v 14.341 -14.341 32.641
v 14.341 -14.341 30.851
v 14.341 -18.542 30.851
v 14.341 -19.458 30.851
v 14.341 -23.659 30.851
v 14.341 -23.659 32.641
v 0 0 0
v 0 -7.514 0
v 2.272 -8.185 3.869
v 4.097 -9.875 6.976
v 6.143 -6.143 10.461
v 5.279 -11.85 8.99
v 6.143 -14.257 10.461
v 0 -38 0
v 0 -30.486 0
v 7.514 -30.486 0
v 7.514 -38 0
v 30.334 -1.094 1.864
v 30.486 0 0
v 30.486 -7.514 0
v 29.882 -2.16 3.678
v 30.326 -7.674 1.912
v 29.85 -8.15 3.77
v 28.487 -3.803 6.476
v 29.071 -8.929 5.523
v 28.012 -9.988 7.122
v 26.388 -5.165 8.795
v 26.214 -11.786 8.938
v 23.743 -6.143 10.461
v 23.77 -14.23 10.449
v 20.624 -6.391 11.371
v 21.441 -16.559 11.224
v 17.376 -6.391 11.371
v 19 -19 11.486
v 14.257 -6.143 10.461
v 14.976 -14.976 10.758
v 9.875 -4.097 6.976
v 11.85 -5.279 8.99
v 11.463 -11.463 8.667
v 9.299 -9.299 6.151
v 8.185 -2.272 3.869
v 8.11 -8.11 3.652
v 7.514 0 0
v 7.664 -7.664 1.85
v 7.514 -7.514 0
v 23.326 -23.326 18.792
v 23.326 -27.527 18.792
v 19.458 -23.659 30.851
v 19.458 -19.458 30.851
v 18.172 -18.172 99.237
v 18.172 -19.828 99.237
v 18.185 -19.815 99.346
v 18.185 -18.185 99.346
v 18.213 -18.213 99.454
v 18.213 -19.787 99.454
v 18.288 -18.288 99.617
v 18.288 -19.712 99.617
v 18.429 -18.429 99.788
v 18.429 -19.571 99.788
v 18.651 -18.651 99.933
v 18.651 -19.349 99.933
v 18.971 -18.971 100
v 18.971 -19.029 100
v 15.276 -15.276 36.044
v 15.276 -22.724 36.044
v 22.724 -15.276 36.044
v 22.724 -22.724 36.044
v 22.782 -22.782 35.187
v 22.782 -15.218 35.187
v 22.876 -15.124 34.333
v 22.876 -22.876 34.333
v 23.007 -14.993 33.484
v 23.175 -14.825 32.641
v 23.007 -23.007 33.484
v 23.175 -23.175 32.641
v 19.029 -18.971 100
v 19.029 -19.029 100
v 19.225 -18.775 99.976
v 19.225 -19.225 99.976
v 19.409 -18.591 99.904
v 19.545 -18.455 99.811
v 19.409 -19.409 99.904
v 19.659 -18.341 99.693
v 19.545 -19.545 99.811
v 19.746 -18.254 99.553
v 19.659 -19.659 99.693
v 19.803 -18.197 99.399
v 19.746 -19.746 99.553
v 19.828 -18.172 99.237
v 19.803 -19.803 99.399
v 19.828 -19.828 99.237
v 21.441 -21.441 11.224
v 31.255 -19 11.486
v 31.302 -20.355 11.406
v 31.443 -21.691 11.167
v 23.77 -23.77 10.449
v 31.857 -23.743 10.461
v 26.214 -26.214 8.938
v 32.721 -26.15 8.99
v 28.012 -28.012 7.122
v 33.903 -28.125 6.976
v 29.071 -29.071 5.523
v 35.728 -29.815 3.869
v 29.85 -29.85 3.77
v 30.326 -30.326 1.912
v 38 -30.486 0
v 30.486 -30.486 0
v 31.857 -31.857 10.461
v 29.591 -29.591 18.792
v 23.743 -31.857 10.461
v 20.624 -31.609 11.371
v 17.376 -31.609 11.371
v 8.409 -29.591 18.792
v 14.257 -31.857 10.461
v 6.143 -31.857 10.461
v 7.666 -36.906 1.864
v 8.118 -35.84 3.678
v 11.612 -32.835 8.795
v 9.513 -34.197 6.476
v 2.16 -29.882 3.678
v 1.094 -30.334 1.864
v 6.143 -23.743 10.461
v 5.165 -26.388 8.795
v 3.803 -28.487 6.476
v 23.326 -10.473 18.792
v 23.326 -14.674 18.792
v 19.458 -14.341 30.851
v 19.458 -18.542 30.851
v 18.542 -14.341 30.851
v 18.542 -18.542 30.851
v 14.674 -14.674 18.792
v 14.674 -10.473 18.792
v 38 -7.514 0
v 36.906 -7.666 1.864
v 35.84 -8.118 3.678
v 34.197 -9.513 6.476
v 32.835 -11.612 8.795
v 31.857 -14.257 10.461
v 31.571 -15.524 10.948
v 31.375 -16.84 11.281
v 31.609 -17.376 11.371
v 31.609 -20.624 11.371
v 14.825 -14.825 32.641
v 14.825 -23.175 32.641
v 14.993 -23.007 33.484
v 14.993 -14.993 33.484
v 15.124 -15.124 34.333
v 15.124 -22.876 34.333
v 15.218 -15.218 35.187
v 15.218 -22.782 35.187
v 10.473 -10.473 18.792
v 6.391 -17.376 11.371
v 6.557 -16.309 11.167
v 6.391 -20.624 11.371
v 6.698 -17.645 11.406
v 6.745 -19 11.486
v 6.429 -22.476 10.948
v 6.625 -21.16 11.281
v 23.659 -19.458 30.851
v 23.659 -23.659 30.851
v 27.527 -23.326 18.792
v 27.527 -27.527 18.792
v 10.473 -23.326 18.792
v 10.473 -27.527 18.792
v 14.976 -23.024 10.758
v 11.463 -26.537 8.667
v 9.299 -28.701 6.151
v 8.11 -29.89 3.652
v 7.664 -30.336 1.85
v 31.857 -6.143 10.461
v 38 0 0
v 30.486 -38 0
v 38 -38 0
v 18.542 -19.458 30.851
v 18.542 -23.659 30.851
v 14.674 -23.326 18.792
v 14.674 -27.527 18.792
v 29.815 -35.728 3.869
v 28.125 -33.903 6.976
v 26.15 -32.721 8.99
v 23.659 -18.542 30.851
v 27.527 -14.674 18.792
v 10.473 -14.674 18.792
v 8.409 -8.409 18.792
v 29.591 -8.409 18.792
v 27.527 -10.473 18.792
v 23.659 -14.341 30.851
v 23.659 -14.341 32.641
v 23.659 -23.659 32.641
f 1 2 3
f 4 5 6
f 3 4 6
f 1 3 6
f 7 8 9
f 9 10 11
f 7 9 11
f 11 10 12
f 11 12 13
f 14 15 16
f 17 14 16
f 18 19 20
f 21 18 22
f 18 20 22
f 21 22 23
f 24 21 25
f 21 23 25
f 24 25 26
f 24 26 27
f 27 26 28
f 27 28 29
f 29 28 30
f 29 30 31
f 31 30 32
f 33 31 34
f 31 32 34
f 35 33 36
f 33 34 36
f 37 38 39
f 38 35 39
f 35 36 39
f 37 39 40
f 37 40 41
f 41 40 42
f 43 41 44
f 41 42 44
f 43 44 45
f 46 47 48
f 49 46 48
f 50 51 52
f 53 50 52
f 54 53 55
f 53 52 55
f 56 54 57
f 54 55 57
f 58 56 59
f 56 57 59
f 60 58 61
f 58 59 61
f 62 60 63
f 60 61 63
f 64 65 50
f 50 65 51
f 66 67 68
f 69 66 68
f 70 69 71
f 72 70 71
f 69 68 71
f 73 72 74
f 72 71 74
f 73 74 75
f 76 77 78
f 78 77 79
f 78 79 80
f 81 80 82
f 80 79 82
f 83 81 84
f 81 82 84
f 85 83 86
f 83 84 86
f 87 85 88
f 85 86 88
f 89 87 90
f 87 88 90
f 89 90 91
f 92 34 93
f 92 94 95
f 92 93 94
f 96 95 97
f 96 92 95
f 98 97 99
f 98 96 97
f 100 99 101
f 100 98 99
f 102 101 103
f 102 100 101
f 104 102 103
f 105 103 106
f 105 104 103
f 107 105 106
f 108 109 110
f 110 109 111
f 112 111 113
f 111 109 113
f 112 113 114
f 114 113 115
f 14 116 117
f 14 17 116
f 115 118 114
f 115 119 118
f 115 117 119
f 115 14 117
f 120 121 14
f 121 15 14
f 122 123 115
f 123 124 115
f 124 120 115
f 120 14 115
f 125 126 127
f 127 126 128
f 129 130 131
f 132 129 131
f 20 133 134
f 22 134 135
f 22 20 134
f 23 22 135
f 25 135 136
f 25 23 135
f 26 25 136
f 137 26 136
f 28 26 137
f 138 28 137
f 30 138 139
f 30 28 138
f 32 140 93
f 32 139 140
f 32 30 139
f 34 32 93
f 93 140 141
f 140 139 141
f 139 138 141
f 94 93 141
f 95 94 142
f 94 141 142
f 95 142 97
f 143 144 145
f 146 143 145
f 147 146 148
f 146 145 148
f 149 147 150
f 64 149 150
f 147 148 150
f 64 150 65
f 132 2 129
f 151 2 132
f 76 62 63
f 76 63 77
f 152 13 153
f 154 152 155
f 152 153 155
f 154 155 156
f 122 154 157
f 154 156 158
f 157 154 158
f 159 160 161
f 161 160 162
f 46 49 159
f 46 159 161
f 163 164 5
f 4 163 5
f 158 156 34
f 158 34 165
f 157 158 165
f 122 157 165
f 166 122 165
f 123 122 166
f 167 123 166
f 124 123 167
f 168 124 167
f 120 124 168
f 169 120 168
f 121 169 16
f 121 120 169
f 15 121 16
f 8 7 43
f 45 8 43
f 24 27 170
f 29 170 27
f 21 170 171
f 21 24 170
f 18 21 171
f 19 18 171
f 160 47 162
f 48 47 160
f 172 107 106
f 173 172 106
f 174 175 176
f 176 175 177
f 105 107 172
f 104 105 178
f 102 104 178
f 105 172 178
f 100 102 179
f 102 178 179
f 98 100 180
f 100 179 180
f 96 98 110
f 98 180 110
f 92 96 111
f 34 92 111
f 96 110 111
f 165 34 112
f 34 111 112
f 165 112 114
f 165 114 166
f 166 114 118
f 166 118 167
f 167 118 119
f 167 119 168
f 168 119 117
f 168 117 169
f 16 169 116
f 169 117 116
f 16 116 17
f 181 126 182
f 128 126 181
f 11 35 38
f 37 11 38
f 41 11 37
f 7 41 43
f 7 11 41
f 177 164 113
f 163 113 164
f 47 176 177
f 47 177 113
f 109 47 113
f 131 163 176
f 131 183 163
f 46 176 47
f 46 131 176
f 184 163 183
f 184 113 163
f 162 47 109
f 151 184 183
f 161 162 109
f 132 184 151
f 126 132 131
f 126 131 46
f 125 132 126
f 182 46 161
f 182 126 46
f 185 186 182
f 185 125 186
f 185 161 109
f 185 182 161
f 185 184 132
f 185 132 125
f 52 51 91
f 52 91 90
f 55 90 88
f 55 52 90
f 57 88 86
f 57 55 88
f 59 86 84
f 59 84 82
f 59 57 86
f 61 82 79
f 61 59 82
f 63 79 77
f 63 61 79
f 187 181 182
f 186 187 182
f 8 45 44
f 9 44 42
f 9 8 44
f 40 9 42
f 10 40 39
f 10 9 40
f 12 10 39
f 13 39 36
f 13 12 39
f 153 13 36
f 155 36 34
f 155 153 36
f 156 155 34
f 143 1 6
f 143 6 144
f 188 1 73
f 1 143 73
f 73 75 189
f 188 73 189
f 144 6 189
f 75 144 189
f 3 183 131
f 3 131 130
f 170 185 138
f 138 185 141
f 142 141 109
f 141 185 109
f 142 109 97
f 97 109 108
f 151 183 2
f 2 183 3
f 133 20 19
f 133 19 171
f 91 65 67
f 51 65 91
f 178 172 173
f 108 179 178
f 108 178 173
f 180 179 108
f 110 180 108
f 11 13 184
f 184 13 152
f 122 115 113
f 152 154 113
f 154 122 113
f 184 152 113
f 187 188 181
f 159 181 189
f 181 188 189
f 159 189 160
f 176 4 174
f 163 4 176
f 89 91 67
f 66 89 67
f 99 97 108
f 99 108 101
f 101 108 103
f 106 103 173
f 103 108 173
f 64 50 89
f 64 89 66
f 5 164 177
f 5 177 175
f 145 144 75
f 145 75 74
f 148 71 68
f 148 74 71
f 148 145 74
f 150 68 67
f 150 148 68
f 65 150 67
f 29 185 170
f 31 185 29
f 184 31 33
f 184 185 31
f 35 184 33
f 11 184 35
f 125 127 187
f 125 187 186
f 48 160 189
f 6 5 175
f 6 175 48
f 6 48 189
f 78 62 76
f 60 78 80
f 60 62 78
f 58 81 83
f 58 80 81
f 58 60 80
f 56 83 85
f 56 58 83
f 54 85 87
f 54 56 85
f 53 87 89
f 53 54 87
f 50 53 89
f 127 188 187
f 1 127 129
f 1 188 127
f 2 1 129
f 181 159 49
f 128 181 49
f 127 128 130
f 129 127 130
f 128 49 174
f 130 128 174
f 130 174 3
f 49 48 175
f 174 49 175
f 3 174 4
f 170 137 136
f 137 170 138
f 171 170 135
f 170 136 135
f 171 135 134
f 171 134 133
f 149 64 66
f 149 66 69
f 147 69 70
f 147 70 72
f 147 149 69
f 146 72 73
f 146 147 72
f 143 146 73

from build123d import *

# Parameters (mm, degrees)
F0_W          = 38
F0_H          = 100
F1_DEPTH      = 38
F3_DEPTH      = 38.001
F4_W          = 59.0429029957
F4_H          = 114.0045975335
F5_DEPTH      = 38.001
F6_T4_DEPTH   = 20.6495370786
F6_T10_DEPTH  = 33.6326816688
F6_T16_DEPTH  = 20.6495370786
F6_S17_R      = 11.4862592402
F6_T18_DEPTH  = 13
F6_T25_DEPTH  = 20.6495370786
F6_T31_DEPTH  = 33.6326816688
F6_T37_DEPTH  = 33.6326816688
F6_T43_DEPTH  = 20.6495370786
F6_T49_DEPTH  = 20.6495370786
F6_S53_R      = 11.4862592402
F6_T54_DEPTH  = 13
F6_T58_DEPTH  = 33.6326816688
F6_T64_DEPTH  = 20.6495370786
F6_T70_DEPTH  = 33.6326816688
F6_T76_DEPTH  = 20.6495370786
F6_T82_DEPTH  = 20.6495370786
F6_S84_R      = 11.4862592402
F6_T85_DEPTH  = 13
F6_T91_DEPTH  = 33.6326816688
F6_T97_DEPTH  = 20.6495370786
F6_T103_DEPTH = 33.6326816688
F6_T109_DEPTH = 20.6495370786
F6_T115_DEPTH = 20.6495370786
F6_S119_R     = 11.4862592402
F6_T120_DEPTH = 13
F6_T124_DEPTH = 33.6326816688
F6_T130_DEPTH = 20.6495370786
F6_T137_DEPTH = 33.6326816688
F6_T143_DEPTH = 33.6326816688
F6_T152_DEPTH = 33.6326816688
F6_T158_DEPTH = 33.6326816688
F6_T167_DEPTH = 33.6326816688
F6_T173_DEPTH = 33.6326816688
F6_T182_DEPTH = 33.6326816688
F6_T188_DEPTH = 33.6326816688


# Not quite as in the source:
# - a fillet or chamfer that OpenCascade refuses, or shapes differently, is made with other operations: its cross-section is extruded or revolved along the edge and cut away or added


with BuildPart() as f1:
    # F0 (on Front) → F1 (new body)
    with BuildSketch(Plane.XZ):
        with Locations((19, 50)):
            Rectangle(F0_W, F0_H)
    extrude(amount=F1_DEPTH)

    # F2 (on face) → F3 (cut, through all)
    with BuildSketch(Plane.XZ.offset(38)):
        with BuildLine():
            ThreePointArc((18.1722940034, 99.2366278339), (18.4188712552, 99.7784903919), (18.9714550646, 100))
            Line((18.9714550646, 100), (0, 100))
            Line((0, 100), (0, 0))
            Line((0, 0), (8.6752314607, 14.7728872032))
            Line((8.6752314607, 14.7728872032), (8.6752314607, 18.7919850665))
            Line((8.6752314607, 18.7919850665), (10.4733575719, 18.7919850665))
            Line((10.4733575719, 18.7919850665), (14.3412563191, 30.8507295043))
            Line((14.3412563191, 30.8507295043), (14.3412563191, 32.6412431896))
            Line((14.3412563191, 32.6412431896), (14.8252512637, 32.6412431896))
            ThreePointArc((14.8252512637, 32.6412431896), (15.1237302322, 34.3327275734), (15.2759763299, 36.0435841545))
            Line((15.2759763299, 36.0435841545), (18.1722940034, 99.2366278339))
        make_face()
        with BuildLine():
            Line((7.5137407598, 0), (30.4862592402, 0))
            ThreePointArc((30.4862592402, 0), (27.1220117992, 8.1220117992), (19, 11.4862592402))
            ThreePointArc((19, 11.4862592402), (10.8779882008, 8.1220117992), (7.5137407598, 0))
        make_face()
        with BuildLine():
            Line((38, 100), (19.0285449354, 100))
            ThreePointArc((19.0285449354, 100), (19.5811287448, 99.7784903919), (19.8277059966, 99.2366278339))
            Line((19.8277059966, 99.2366278339), (22.7240236701, 36.0435841545))
            ThreePointArc((22.7240236701, 36.0435841545), (22.8762697678, 34.3327275734), (23.1747487363, 32.6412431896))
            Line((23.1747487363, 32.6412431896), (23.6587436809, 32.6412431896))
            Line((23.6587436809, 32.6412431896), (23.6587436809, 30.8507295043))
            Line((23.6587436809, 30.8507295043), (27.5266424281, 18.7919850665))
            Line((27.5266424281, 18.7919850665), (29.3247685393, 18.7919850665))
            Line((29.3247685393, 18.7919850665), (29.3247685393, 14.7728872032))
            Line((29.3247685393, 14.7728872032), (38, 0))
            Line((38, 0), (38, 100))
        make_face()
        Polygon((18.5419868585, 30.8507295043), (14.6740881113, 18.7919850665), (23.3259118887, 18.7919850665), (19.4580131415, 30.8507295043), align=None)
    extrude(amount=-F3_DEPTH, mode=Mode.SUBTRACT)

    # F4 (on Right) → F5 (cut, through all)
    with BuildSketch(Plane.YZ):
        with Locations((-17.0494974502, 52.1172431763)):
            Rectangle(F4_W, F4_H)
        with BuildLine():
            Line((-19.0285449354, 100), (-19, 100))
            Line((-19, 100), (-18.9714550646, 100))
            ThreePointArc((-18.9714550646, 100), (-18.4188712552, 99.7784903919), (-18.1722940034, 99.2366278339))
            Line((-18.1722940034, 99.2366278339), (-15.2759763299, 36.0435841545))
            ThreePointArc((-15.2759763299, 36.0435841545), (-15.1237302322, 34.3327275734), (-14.8252512637, 32.6412431896))
            Line((-14.8252512637, 32.6412431896), (-14.3412563191, 32.6412431896))
            Line((-14.3412563191, 32.6412431896), (-14.3412563191, 30.8507295043))
            Line((-14.3412563191, 30.8507295043), (-10.4733575719, 18.7919850665))
            Line((-10.4733575719, 18.7919850665), (-8.6752314607, 18.7919850665))
            Line((-8.6752314607, 18.7919850665), (-8.6752314607, 14.7728872032))
            Line((-8.6752314607, 14.7728872032), (0, 0))
            Line((0, 0), (-7.5137407598, 0))
            ThreePointArc((-7.5137407598, 0), (-10.8779882008, 8.1220117992), (-19, 11.4862592402))
            ThreePointArc((-19, 11.4862592402), (-27.1220117992, 8.1220117992), (-30.4862592402, 0))
            Line((-30.4862592402, 0), (-38, 0))
            Line((-38, 0), (-29.3247685393, 14.7728872032))
            Line((-29.3247685393, 14.7728872032), (-29.3247685393, 18.7919850665))
            Line((-29.3247685393, 18.7919850665), (-27.5266424281, 18.7919850665))
            Line((-27.5266424281, 18.7919850665), (-23.6587436809, 30.8507295043))
            Line((-23.6587436809, 30.8507295043), (-23.6587436809, 32.6412431896))
            Line((-23.6587436809, 32.6412431896), (-23.1747487363, 32.6412431896))
            ThreePointArc((-23.1747487363, 32.6412431896), (-22.8762697678, 34.3327275734), (-22.7240236701, 36.0435841545))
            Line((-22.7240236701, 36.0435841545), (-19.8277059966, 99.2366278339))
            ThreePointArc((-19.8277059966, 99.2366278339), (-19.5811287448, 99.7784903919), (-19.0285449354, 100))
        make_face(mode=Mode.SUBTRACT)
        Polygon((-14.6740881113, 18.7919850665), (-18.5419868585, 30.8507295043), (-19.4580131415, 30.8507295043), (-23.3259118887, 18.7919850665), align=None)
    extrude(amount=F5_DEPTH, mode=Mode.SUBTRACT)

    # F6: chamfer of 5 on 4 edges, made by hand


with BuildPart() as f6_tool2:
    # F6_s3 → F6_t4 (new body)
    with BuildSketch(Plane.XZ.offset(29.3247685393)):
        Polygon((6.1433193707, 10.461342101), (8.6752314607, 19.7728872032), (8.6752314607, 14.7728872032), align=None)
    extrude(amount=-F6_T4_DEPTH)

    split(bisect_by=Plane(origin=(0, -28.2559201757, 16.59300882), x_dir=(1, 0, 0), z_dir=(0, -0.8623090204, 0.506382418)), keep=Keep.TOP)

    split(bisect_by=Plane.XY.offset(18.7919850665), keep=Keep.BOTTOM)


with BuildPart() as f1_1:
    add(f1.part)

    # F6_t1: union F6_tool2
    add(f6_tool2.part)


with BuildPart() as f6_tool8:
    # F6_s9 → F6_t10 (new body)
    with BuildSketch(Plane.XZ.offset(42.3079131295)):
        Polygon((6.1433193707, 10.461342101), (8.6752314607, 19.7728872032), (8.6752314607, 14.7728872032), align=None)
    extrude(amount=-F6_T10_DEPTH)

    split(bisect_by=Plane(origin=(0, -28.2559201757, 16.59300882), x_dir=(1, 0, 0), z_dir=(0, 0.8623090204, -0.506382418)), keep=Keep.TOP)

    split(bisect_by=Plane.XZ.offset(29.3247685393), keep=Keep.TOP)


with BuildPart() as f1_2:
    add(f1_1.part)

    # F6_t7: union F6_tool8
    add(f6_tool8.part)


with BuildPart() as f6_tool14:
    # F6_s15 → F6_t16 (new body)
    with BuildSketch(Plane.XZ.offset(29.3247685393)):
        Polygon((6.1433193707, 10.461342101), (8.6752314607, 19.7728872032), (8.6752314607, 14.7728872032), align=None)
    extrude(amount=-F6_T16_DEPTH)

    # F6_s17 → F6_t18 (cut, symmetric)
    with BuildSketch(Plane.YZ.offset(7.4)):
        with Locations((-19, 0)):
            Circle(F6_S17_R)
    extrude(amount=F6_T18_DEPTH, both=True, mode=Mode.SUBTRACT)

    split(bisect_by=Plane(origin=(0, -28.2559201757, 16.59300882), x_dir=(1, 0, 0), z_dir=(0, 0.8623090204, -0.506382418)), keep=Keep.TOP)

    split(bisect_by=Plane(origin=(0, 0, 0), x_dir=(1, 0, 0), z_dir=(0, -0.8623090204, -0.506382418)), keep=Keep.TOP)

    split(bisect_by=Plane.XY.offset(18.7919850665), keep=Keep.BOTTOM)


with BuildPart() as f1_3:
    add(f1_2.part)

    # F6_t13: union F6_tool14
    add(f6_tool14.part)


with BuildPart() as f6_tool23:
    # F6_s24 → F6_t25 (new body)
    with BuildSketch(Plane.XZ.offset(29.3247685393)):
        Polygon((6.1433193707, 10.461342101), (8.6752314607, 19.7728872032), (8.6752314607, 14.7728872032), align=None)
    extrude(amount=-F6_T25_DEPTH)

    split(bisect_by=Plane(origin=(0, 0, 0), x_dir=(1, 0, 0), z_dir=(0, 0.8623090204, 0.506382418)), keep=Keep.TOP)

    split(bisect_by=Plane.XY.offset(18.7919850665), keep=Keep.BOTTOM)


with BuildPart() as f1_4:
    add(f1_3.part)

    # F6_t22: union F6_tool23
    add(f6_tool23.part)


with BuildPart() as f6_tool29:
    # F6_s30 → F6_t31 (new body)
    with BuildSketch(Plane.XZ.offset(29.3247685393)):
        Polygon((6.1433193707, 10.461342101), (8.6752314607, 19.7728872032), (8.6752314607, 14.7728872032), align=None)
    extrude(amount=-F6_T31_DEPTH)

    split(bisect_by=Plane(origin=(0, 0, 0), x_dir=(1, 0, 0), z_dir=(0, -0.8623090204, -0.506382418)), keep=Keep.TOP)

    split(bisect_by=Plane.XZ.offset(8.6752314607), keep=Keep.BOTTOM)


with BuildPart() as f1_5:
    add(f1_4.part)

    # F6_t28: union F6_tool29
    add(f6_tool29.part)


with BuildPart() as f6_tool35:
    # F6_s36 → F6_t37 (new body)
    with BuildSketch(Plane.YZ.offset(-4.3079131295)):
        Polygon((-29.3247685393, 19.7728872032), (-31.8566806293, 10.461342101), (-29.3247685393, 14.7728872032), align=None)
    extrude(amount=F6_T37_DEPTH)

    split(bisect_by=Plane(origin=(0, 0, 0), x_dir=(0, 1, 0), z_dir=(0.8623090204, 0, -0.506382418)), keep=Keep.TOP)

    split(bisect_by=Plane.YZ.offset(8.6752314607), keep=Keep.BOTTOM)


with BuildPart() as f1_6:
    add(f1_5.part)

    # F6_t34: union F6_tool35
    add(f6_tool35.part)


with BuildPart() as f6_tool41:
    # F6_s42 → F6_t43 (new body)
    with BuildSketch(Plane.YZ.offset(8.6752314607)):
        Polygon((-29.3247685393, 19.7728872032), (-31.8566806293, 10.461342101), (-29.3247685393, 14.7728872032), align=None)
    extrude(amount=F6_T43_DEPTH)

    split(bisect_by=Plane(origin=(0, 0, 0), x_dir=(0, 1, 0), z_dir=(-0.8623090204, 0, 0.506382418)), keep=Keep.TOP)

    split(bisect_by=Plane.XY.offset(18.7919850665), keep=Keep.BOTTOM)


with BuildPart() as f1_7:
    add(f1_6.part)

    # F6_t40: union F6_tool41
    add(f6_tool41.part)


with BuildPart() as f6_tool47:
    # F6_s48 → F6_t49 (new body)
    with BuildSketch(Plane.YZ.offset(8.6752314607)):
        Polygon((-29.3247685393, 19.7728872032), (-31.8566806293, 10.461342101), (-29.3247685393, 14.7728872032), align=None)
    extrude(amount=F6_T49_DEPTH)

    split(bisect_by=Plane(origin=(0, 0, 0), x_dir=(0, 1, 0), z_dir=(0.8623090204, 0, -0.506382418)), keep=Keep.TOP)

    split(bisect_by=Plane.XY.offset(18.7919850665), keep=Keep.BOTTOM)

    split(bisect_by=Plane(origin=(28.2559201757, 0, 16.59300882), x_dir=(0, 1, 0), z_dir=(-0.8623090204, 0, -0.506382418)), keep=Keep.TOP)

    # F6_s53 → F6_t54 (cut, symmetric)
    with BuildSketch(Plane.XZ.offset(30.6)):
        with Locations((19, 0)):
            Circle(F6_S53_R)
    extrude(amount=F6_T54_DEPTH, both=True, mode=Mode.SUBTRACT)


with BuildPart() as f1_8:
    add(f1_7.part)

    # F6_t46: union F6_tool47
    add(f6_tool47.part)


with BuildPart() as f6_tool56:
    # F6_s57 → F6_t58 (new body)
    with BuildSketch(Plane.YZ.offset(8.6752314607)):
        Polygon((-29.3247685393, 19.7728872032), (-31.8566806293, 10.461342101), (-29.3247685393, 14.7728872032), align=None)
    extrude(amount=F6_T58_DEPTH)

    split(bisect_by=Plane.YZ.offset(29.3247685393), keep=Keep.TOP)

    split(bisect_by=Plane(origin=(28.2559201757, 0, 16.59300882), x_dir=(0, 1, 0), z_dir=(-0.8623090204, 0, -0.506382418)), keep=Keep.TOP)


with BuildPart() as f1_9:
    add(f1_8.part)

    # F6_t55: union F6_tool56
    add(f6_tool56.part)


with BuildPart() as f6_tool62:
    # F6_s63 → F6_t64 (new body)
    with BuildSketch(Plane.YZ.offset(8.6752314607)):
        Polygon((-29.3247685393, 19.7728872032), (-31.8566806293, 10.461342101), (-29.3247685393, 14.7728872032), align=None)
    extrude(amount=F6_T64_DEPTH)

    split(bisect_by=Plane.XY.offset(18.7919850665), keep=Keep.BOTTOM)

    split(bisect_by=Plane(origin=(28.2559201757, 0, 16.59300882), x_dir=(0, 1, 0), z_dir=(0.8623090204, 0, 0.506382418)), keep=Keep.TOP)


with BuildPart() as f1_10:
    add(f1_9.part)

    # F6_t61: union F6_tool62
    add(f6_tool62.part)


with BuildPart() as f6_tool68:
    # F6_s69 → F6_t70 (new body)
    with BuildSketch(Plane.XZ.offset(42.3079131295)):
        Polygon((29.3247685393, 19.7728872032), (31.8566806293, 10.461342101), (29.3247685393, 14.7728872032), align=None)
    extrude(amount=-F6_T70_DEPTH)

    split(bisect_by=Plane.XZ.offset(29.3247685393), keep=Keep.TOP)

    split(bisect_by=Plane(origin=(0, -28.2559201757, 16.59300882), x_dir=(1, 0, 0), z_dir=(0, 0.8623090204, -0.506382418)), keep=Keep.TOP)


with BuildPart() as f1_11:
    add(f1_10.part)

    # F6_t67: union F6_tool68
    add(f6_tool68.part)


with BuildPart() as f6_tool74:
    # F6_s75 → F6_t76 (new body)
    with BuildSketch(Plane.XZ.offset(29.3247685393)):
        Polygon((29.3247685393, 19.7728872032), (31.8566806293, 10.461342101), (29.3247685393, 14.7728872032), align=None)
    extrude(amount=-F6_T76_DEPTH)

    split(bisect_by=Plane.XY.offset(18.7919850665), keep=Keep.BOTTOM)

    split(bisect_by=Plane(origin=(0, -28.2559201757, 16.59300882), x_dir=(1, 0, 0), z_dir=(0, -0.8623090204, 0.506382418)), keep=Keep.TOP)


with BuildPart() as f1_12:
    add(f1_11.part)

    # F6_t73: union F6_tool74
    add(f6_tool74.part)


with BuildPart() as f6_tool80:
    # F6_s81 → F6_t82 (new body)
    with BuildSketch(Plane.XZ.offset(29.3247685393)):
        Polygon((29.3247685393, 19.7728872032), (31.8566806293, 10.461342101), (29.3247685393, 14.7728872032), align=None)
    extrude(amount=-F6_T82_DEPTH)

    split(bisect_by=Plane.XY.offset(18.7919850665), keep=Keep.BOTTOM)

    # F6_s84 → F6_t85 (cut, symmetric)
    with BuildSketch(Plane.YZ.offset(30.6)):
        with Locations((-19, 0)):
            Circle(F6_S84_R)
    extrude(amount=F6_T85_DEPTH, both=True, mode=Mode.SUBTRACT)

    split(bisect_by=Plane(origin=(0, 0, 0), x_dir=(1, 0, 0), z_dir=(0, -0.8623090204, -0.506382418)), keep=Keep.TOP)

    split(bisect_by=Plane(origin=(0, -28.2559201757, 16.59300882), x_dir=(1, 0, 0), z_dir=(0, 0.8623090204, -0.506382418)), keep=Keep.TOP)


with BuildPart() as f1_13:
    add(f1_12.part)

    # F6_t79: union F6_tool80
    add(f6_tool80.part)


with BuildPart() as f6_tool89:
    # F6_s90 → F6_t91 (new body)
    with BuildSketch(Plane.XZ.offset(29.3247685393)):
        Polygon((29.3247685393, 19.7728872032), (31.8566806293, 10.461342101), (29.3247685393, 14.7728872032), align=None)
    extrude(amount=-F6_T91_DEPTH)

    split(bisect_by=Plane.XZ.offset(8.6752314607), keep=Keep.BOTTOM)

    split(bisect_by=Plane(origin=(0, 0, 0), x_dir=(1, 0, 0), z_dir=(0, -0.8623090204, -0.506382418)), keep=Keep.TOP)


with BuildPart() as f1_14:
    add(f1_13.part)

    # F6_t88: union F6_tool89
    add(f6_tool89.part)


with BuildPart() as f6_tool95:
    # F6_s96 → F6_t97 (new body)
    with BuildSketch(Plane.XZ.offset(29.3247685393)):
        Polygon((29.3247685393, 19.7728872032), (31.8566806293, 10.461342101), (29.3247685393, 14.7728872032), align=None)
    extrude(amount=-F6_T97_DEPTH)

    split(bisect_by=Plane.XY.offset(18.7919850665), keep=Keep.BOTTOM)

    split(bisect_by=Plane(origin=(0, 0, 0), x_dir=(1, 0, 0), z_dir=(0, 0.8623090204, 0.506382418)), keep=Keep.TOP)


with BuildPart() as f1_15:
    add(f1_14.part)

    # F6_t94: union F6_tool95
    add(f6_tool95.part)


with BuildPart() as f6_tool101:
    # F6_s102 → F6_t103 (new body)
    with BuildSketch(Plane.YZ.offset(-4.3079131295)):
        Polygon((-8.6752314607, 19.7728872032), (-6.1433193707, 10.461342101), (-8.6752314607, 14.7728872032), align=None)
    extrude(amount=F6_T103_DEPTH)

    split(bisect_by=Plane(origin=(0, 0, 0), x_dir=(0, 1, 0), z_dir=(0.8623090204, 0, -0.506382418)), keep=Keep.TOP)

    split(bisect_by=Plane.YZ.offset(8.6752314607), keep=Keep.BOTTOM)


with BuildPart() as f1_16:
    add(f1_15.part)

    # F6_t100: union F6_tool101
    add(f6_tool101.part)


with BuildPart() as f6_tool107:
    # F6_s108 → F6_t109 (new body)
    with BuildSketch(Plane.YZ.offset(8.6752314607)):
        Polygon((-8.6752314607, 19.7728872032), (-6.1433193707, 10.461342101), (-8.6752314607, 14.7728872032), align=None)
    extrude(amount=F6_T109_DEPTH)

    split(bisect_by=Plane(origin=(0, 0, 0), x_dir=(0, 1, 0), z_dir=(-0.8623090204, 0, 0.506382418)), keep=Keep.TOP)

    split(bisect_by=Plane.XY.offset(18.7919850665), keep=Keep.BOTTOM)


with BuildPart() as f1_17:
    add(f1_16.part)

    # F6_t106: union F6_tool107
    add(f6_tool107.part)


with BuildPart() as f6_tool113:
    # F6_s114 → F6_t115 (new body)
    with BuildSketch(Plane.YZ.offset(8.6752314607)):
        Polygon((-8.6752314607, 19.7728872032), (-6.1433193707, 10.461342101), (-8.6752314607, 14.7728872032), align=None)
    extrude(amount=F6_T115_DEPTH)

    split(bisect_by=Plane(origin=(0, 0, 0), x_dir=(0, 1, 0), z_dir=(0.8623090204, 0, -0.506382418)), keep=Keep.TOP)

    split(bisect_by=Plane.XY.offset(18.7919850665), keep=Keep.BOTTOM)

    split(bisect_by=Plane(origin=(28.2559201757, 0, 16.59300882), x_dir=(0, 1, 0), z_dir=(-0.8623090204, 0, -0.506382418)), keep=Keep.TOP)

    # F6_s119 → F6_t120 (cut, symmetric)
    with BuildSketch(Plane.XZ.offset(7.4)):
        with Locations((19, 0)):
            Circle(F6_S119_R)
    extrude(amount=F6_T120_DEPTH, both=True, mode=Mode.SUBTRACT)


with BuildPart() as f1_18:
    add(f1_17.part)

    # F6_t112: union F6_tool113
    add(f6_tool113.part)


with BuildPart() as f6_tool122:
    # F6_s123 → F6_t124 (new body)
    with BuildSketch(Plane.YZ.offset(8.6752314607)):
        Polygon((-8.6752314607, 19.7728872032), (-6.1433193707, 10.461342101), (-8.6752314607, 14.7728872032), align=None)
    extrude(amount=F6_T124_DEPTH)

    split(bisect_by=Plane.YZ.offset(29.3247685393), keep=Keep.TOP)

    split(bisect_by=Plane(origin=(28.2559201757, 0, 16.59300882), x_dir=(0, 1, 0), z_dir=(-0.8623090204, 0, -0.506382418)), keep=Keep.TOP)


with BuildPart() as f1_19:
    add(f1_18.part)

    # F6_t121: union F6_tool122
    add(f6_tool122.part)


with BuildPart() as f6_tool128:
    # F6_s129 → F6_t130 (new body)
    with BuildSketch(Plane.YZ.offset(8.6752314607)):
        Polygon((-8.6752314607, 19.7728872032), (-6.1433193707, 10.461342101), (-8.6752314607, 14.7728872032), align=None)
    extrude(amount=F6_T130_DEPTH)

    split(bisect_by=Plane.XY.offset(18.7919850665), keep=Keep.BOTTOM)

    split(bisect_by=Plane(origin=(28.2559201757, 0, 16.59300882), x_dir=(0, 1, 0), z_dir=(0.8623090204, 0, 0.506382418)), keep=Keep.TOP)


with BuildPart() as f1_20:
    add(f1_19.part)

    # F6_t127: union F6_tool128
    add(f6_tool128.part)


with BuildPart() as f6_tool135:
    # F6_s136 → F6_t137 (new body)
    with BuildSketch(Plane.XZ.offset(42.3079131295)):
        Polygon((6.1433193707, 10.461342101), (8.6752314607, 19.7728872032), (8.6752314607, 14.7728872032), align=None)
    extrude(amount=-F6_T137_DEPTH)

    split(bisect_by=Plane(origin=(0, -28.2559201757, 16.59300882), x_dir=(1, 0, 0), z_dir=(0, -0.8623090204, 0.506382418)), keep=Keep.TOP)

    split(bisect_by=Plane.XZ.offset(29.3247685393), keep=Keep.TOP)

    split(bisect_by=Plane.XY.offset(18.7919850665), keep=Keep.BOTTOM)


with BuildPart() as f6_tool141:
    # F6_s142 → F6_t143 (new body)
    with BuildSketch(Plane.YZ.offset(-4.3079131295)):
        Polygon((-29.3247685393, 19.7728872032), (-31.8566806293, 10.461342101), (-29.3247685393, 14.7728872032), align=None)
    extrude(amount=F6_T143_DEPTH)

    split(bisect_by=Plane(origin=(0, 0, 0), x_dir=(0, 1, 0), z_dir=(-0.8623090204, 0, 0.506382418)), keep=Keep.TOP)

    split(bisect_by=Plane.YZ.offset(8.6752314607), keep=Keep.BOTTOM)

    split(bisect_by=Plane.XY.offset(18.7919850665), keep=Keep.BOTTOM)


with BuildPart() as f6_tool135_1:
    add(f6_tool135.part)

    # F6_t147: intersect F6_tool141
    add(f6_tool141.part, mode=Mode.INTERSECT)


with BuildPart() as f1_21:
    add(f1_20.part)

    # F6_t133: union F6_tool135
    add(f6_tool135_1.part)


with BuildPart() as f6_tool150:
    # F6_s151 → F6_t152 (new body)
    with BuildSketch(Plane.XZ.offset(29.3247685393)):
        Polygon((6.1433193707, 10.461342101), (8.6752314607, 19.7728872032), (8.6752314607, 14.7728872032), align=None)
    extrude(amount=-F6_T152_DEPTH)

    split(bisect_by=Plane(origin=(0, 0, 0), x_dir=(1, 0, 0), z_dir=(0, 0.8623090204, 0.506382418)), keep=Keep.TOP)

    split(bisect_by=Plane.XZ.offset(8.6752314607), keep=Keep.BOTTOM)

    split(bisect_by=Plane.XY.offset(18.7919850665), keep=Keep.BOTTOM)


with BuildPart() as f6_tool156:
    # F6_s157 → F6_t158 (new body)
    with BuildSketch(Plane.YZ.offset(-4.3079131295)):
        Polygon((-8.6752314607, 19.7728872032), (-6.1433193707, 10.461342101), (-8.6752314607, 14.7728872032), align=None)
    extrude(amount=F6_T158_DEPTH)

    split(bisect_by=Plane(origin=(0, 0, 0), x_dir=(0, 1, 0), z_dir=(-0.8623090204, 0, 0.506382418)), keep=Keep.TOP)

    split(bisect_by=Plane.YZ.offset(8.6752314607), keep=Keep.BOTTOM)

    split(bisect_by=Plane.XY.offset(18.7919850665), keep=Keep.BOTTOM)


with BuildPart() as f6_tool150_1:
    add(f6_tool150.part)

    # F6_t162: intersect F6_tool156
    add(f6_tool156.part, mode=Mode.INTERSECT)


with BuildPart() as f1_22:
    add(f1_21.part)

    # F6_t148: union F6_tool150
    add(f6_tool150_1.part)


with BuildPart() as f6_tool165:
    # F6_s166 → F6_t167 (new body)
    with BuildSketch(Plane.XZ.offset(42.3079131295)):
        Polygon((29.3247685393, 19.7728872032), (31.8566806293, 10.461342101), (29.3247685393, 14.7728872032), align=None)
    extrude(amount=-F6_T167_DEPTH)

    split(bisect_by=Plane.XY.offset(18.7919850665), keep=Keep.BOTTOM)

    split(bisect_by=Plane.XZ.offset(29.3247685393), keep=Keep.TOP)

    split(bisect_by=Plane(origin=(0, -28.2559201757, 16.59300882), x_dir=(1, 0, 0), z_dir=(0, -0.8623090204, 0.506382418)), keep=Keep.TOP)


with BuildPart() as f6_tool171:
    # F6_s172 → F6_t173 (new body)
    with BuildSketch(Plane.YZ.offset(8.6752314607)):
        Polygon((-29.3247685393, 19.7728872032), (-31.8566806293, 10.461342101), (-29.3247685393, 14.7728872032), align=None)
    extrude(amount=F6_T173_DEPTH)

    split(bisect_by=Plane.XY.offset(18.7919850665), keep=Keep.BOTTOM)

    split(bisect_by=Plane.YZ.offset(29.3247685393), keep=Keep.TOP)

    split(bisect_by=Plane(origin=(28.2559201757, 0, 16.59300882), x_dir=(0, 1, 0), z_dir=(0.8623090204, 0, 0.506382418)), keep=Keep.TOP)


with BuildPart() as f6_tool165_1:
    add(f6_tool165.part)

    # F6_t177: intersect F6_tool171
    add(f6_tool171.part, mode=Mode.INTERSECT)


with BuildPart() as f1_23:
    add(f1_22.part)

    # F6_t163: union F6_tool165
    add(f6_tool165_1.part)


with BuildPart() as f6_tool180:
    # F6_s181 → F6_t182 (new body)
    with BuildSketch(Plane.XZ.offset(29.3247685393)):
        Polygon((29.3247685393, 19.7728872032), (31.8566806293, 10.461342101), (29.3247685393, 14.7728872032), align=None)
    extrude(amount=-F6_T182_DEPTH)

    split(bisect_by=Plane.XY.offset(18.7919850665), keep=Keep.BOTTOM)

    split(bisect_by=Plane.XZ.offset(8.6752314607), keep=Keep.BOTTOM)

    split(bisect_by=Plane(origin=(0, 0, 0), x_dir=(1, 0, 0), z_dir=(0, 0.8623090204, 0.506382418)), keep=Keep.TOP)


with BuildPart() as f6_tool186:
    # F6_s187 → F6_t188 (new body)
    with BuildSketch(Plane.YZ.offset(8.6752314607)):
        Polygon((-8.6752314607, 19.7728872032), (-6.1433193707, 10.461342101), (-8.6752314607, 14.7728872032), align=None)
    extrude(amount=F6_T188_DEPTH)

    split(bisect_by=Plane.XY.offset(18.7919850665), keep=Keep.BOTTOM)

    split(bisect_by=Plane.YZ.offset(29.3247685393), keep=Keep.TOP)

    split(bisect_by=Plane(origin=(28.2559201757, 0, 16.59300882), x_dir=(0, 1, 0), z_dir=(0.8623090204, 0, 0.506382418)), keep=Keep.TOP)


with BuildPart() as f6_tool180_1:
    add(f6_tool180.part)

    # F6_t192: intersect F6_tool186
    add(f6_tool186.part, mode=Mode.INTERSECT)


with BuildPart() as f1_24:
    add(f1_23.part)

    # F6_t178: union F6_tool180
    add(f6_tool180_1.part)


solid = f1_24.part
